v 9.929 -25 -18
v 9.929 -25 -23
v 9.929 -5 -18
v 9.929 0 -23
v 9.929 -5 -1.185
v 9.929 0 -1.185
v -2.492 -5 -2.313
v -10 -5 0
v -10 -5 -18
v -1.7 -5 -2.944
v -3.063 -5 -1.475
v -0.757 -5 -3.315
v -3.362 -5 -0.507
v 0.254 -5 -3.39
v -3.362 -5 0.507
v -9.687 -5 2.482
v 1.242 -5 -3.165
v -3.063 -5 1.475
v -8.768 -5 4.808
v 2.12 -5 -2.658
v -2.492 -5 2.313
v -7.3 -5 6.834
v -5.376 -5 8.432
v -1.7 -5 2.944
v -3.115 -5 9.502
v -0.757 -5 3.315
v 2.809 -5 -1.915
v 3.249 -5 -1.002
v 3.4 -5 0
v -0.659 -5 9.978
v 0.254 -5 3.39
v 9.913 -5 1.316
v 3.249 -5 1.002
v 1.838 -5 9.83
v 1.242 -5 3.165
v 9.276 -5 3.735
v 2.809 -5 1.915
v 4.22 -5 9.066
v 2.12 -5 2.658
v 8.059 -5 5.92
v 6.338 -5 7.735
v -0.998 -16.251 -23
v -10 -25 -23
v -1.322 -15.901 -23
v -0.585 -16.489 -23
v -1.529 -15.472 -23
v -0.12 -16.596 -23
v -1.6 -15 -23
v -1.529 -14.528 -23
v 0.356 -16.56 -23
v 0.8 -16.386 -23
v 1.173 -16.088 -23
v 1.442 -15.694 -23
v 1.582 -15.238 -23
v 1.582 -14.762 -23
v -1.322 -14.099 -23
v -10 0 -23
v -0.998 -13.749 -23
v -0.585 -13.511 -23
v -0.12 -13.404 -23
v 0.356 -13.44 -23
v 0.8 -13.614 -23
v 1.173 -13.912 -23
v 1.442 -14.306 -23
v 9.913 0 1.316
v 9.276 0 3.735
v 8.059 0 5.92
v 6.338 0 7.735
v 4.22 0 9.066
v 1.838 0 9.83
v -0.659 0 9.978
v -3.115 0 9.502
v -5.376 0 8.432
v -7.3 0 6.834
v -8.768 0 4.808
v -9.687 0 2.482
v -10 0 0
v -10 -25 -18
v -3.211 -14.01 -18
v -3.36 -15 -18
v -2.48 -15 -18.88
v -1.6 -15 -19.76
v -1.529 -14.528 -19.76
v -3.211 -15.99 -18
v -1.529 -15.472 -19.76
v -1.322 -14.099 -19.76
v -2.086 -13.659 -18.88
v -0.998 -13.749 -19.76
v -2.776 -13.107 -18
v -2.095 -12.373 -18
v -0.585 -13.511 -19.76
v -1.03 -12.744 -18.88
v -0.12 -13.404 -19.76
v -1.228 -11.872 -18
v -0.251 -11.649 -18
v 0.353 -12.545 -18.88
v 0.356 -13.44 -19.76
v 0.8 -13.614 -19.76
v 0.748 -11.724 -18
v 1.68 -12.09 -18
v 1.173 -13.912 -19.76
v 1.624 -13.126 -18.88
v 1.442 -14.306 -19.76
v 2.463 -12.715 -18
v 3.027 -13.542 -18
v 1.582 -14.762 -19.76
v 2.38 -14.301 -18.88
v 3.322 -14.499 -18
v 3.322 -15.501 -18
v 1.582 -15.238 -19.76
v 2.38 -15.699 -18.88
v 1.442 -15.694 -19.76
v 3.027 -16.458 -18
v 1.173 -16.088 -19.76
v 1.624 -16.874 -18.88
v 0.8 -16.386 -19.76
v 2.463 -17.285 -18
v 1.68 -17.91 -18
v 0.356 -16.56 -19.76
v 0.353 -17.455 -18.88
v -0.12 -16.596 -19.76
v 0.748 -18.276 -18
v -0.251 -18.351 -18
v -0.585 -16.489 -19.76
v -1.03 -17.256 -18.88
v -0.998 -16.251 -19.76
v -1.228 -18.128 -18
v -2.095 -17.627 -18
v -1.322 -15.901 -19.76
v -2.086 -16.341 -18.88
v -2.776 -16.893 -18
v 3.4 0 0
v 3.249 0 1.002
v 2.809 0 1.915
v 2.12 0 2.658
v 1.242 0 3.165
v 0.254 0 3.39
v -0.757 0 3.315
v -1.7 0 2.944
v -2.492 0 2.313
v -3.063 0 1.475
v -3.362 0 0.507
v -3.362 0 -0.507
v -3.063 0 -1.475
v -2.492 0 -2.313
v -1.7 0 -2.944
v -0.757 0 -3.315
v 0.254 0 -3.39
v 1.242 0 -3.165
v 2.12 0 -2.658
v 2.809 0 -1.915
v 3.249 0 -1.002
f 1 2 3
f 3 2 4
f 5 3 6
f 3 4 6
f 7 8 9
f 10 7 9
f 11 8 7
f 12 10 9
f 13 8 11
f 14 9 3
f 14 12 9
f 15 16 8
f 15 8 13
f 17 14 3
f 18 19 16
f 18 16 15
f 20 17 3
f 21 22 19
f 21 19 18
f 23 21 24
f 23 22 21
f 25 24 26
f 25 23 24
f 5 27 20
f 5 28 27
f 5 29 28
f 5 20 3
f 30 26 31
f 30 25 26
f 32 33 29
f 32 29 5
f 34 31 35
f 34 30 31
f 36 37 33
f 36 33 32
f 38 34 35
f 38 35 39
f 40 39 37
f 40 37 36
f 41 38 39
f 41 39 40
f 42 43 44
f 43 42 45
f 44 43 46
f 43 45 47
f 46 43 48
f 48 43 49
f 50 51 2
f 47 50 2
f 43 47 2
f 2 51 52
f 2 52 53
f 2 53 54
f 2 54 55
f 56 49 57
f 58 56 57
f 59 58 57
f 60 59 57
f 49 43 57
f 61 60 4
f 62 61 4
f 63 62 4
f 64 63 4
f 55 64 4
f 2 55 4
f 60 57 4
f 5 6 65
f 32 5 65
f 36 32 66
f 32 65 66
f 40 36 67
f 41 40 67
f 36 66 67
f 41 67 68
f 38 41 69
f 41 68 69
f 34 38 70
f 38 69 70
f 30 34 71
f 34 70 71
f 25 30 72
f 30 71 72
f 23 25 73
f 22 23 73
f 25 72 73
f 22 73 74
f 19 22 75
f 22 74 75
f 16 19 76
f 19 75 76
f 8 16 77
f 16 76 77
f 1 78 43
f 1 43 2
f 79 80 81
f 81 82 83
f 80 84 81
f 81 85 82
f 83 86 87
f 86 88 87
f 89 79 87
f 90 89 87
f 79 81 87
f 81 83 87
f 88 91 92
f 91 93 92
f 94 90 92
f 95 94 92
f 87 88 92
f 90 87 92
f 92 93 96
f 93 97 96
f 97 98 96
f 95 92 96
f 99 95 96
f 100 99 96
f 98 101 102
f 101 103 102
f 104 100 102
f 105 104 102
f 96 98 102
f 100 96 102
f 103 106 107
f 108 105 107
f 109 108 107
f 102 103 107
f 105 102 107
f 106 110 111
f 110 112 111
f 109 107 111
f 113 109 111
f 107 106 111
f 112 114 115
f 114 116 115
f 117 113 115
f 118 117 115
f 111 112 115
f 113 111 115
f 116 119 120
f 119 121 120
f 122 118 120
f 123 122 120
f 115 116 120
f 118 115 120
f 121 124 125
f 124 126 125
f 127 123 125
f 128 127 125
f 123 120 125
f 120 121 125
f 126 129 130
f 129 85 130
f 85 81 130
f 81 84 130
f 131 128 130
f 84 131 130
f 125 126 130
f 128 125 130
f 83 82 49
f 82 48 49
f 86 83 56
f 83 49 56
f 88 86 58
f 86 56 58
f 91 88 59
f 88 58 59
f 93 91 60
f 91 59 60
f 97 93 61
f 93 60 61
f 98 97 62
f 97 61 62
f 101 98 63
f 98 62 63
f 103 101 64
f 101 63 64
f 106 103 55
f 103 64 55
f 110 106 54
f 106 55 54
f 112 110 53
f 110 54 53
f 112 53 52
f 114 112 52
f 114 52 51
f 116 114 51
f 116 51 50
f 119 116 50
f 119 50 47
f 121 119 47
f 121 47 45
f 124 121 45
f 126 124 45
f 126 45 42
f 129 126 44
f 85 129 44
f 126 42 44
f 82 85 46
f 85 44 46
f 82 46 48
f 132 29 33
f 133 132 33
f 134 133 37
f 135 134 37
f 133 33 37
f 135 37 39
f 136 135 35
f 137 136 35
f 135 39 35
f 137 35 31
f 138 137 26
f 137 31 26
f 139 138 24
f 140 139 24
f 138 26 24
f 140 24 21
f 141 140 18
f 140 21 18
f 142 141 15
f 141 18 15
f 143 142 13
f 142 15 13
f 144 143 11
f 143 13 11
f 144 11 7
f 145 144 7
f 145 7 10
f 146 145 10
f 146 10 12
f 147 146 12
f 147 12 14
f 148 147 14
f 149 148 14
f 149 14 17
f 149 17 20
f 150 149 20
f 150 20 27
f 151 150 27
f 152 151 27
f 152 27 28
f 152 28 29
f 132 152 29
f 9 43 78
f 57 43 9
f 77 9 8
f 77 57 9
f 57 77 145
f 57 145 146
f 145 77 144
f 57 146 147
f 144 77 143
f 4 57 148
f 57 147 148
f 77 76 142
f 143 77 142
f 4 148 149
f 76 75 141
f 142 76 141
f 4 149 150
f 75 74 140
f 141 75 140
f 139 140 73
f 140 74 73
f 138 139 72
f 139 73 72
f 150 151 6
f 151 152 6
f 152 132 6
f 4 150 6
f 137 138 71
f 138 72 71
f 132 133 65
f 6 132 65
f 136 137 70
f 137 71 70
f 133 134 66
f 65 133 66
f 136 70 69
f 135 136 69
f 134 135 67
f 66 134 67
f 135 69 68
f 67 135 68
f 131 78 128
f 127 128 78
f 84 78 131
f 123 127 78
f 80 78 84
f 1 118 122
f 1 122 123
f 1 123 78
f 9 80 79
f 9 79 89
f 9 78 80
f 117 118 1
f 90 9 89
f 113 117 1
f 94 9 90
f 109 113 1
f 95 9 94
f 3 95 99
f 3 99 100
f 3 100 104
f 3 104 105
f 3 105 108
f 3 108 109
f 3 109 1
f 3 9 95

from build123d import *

# Parameters (mm, degrees)
F1_DEPTH       = 5
F2_W           = 19.9294948324
F2_H           = 5
F3_DEPTH       = 20
F5_D           = 6.8
F7_D           = 3.2
F7_CSINK_D     = 6.72
F7_CSINK_ANGLE = 90


with BuildPart() as f1:
    # F0 (on Front) → F1 (new body)
    with BuildSketch(Plane.XZ):
        with BuildLine():
            Line((9.9294948324, -23), (9.9294948324, -1.1853827958))
            ThreePointArc((9.9294948324, -1.1853827958), (0.5937388633, 9.9823581464), (-10, 0))
            Line((-10, 0), (-10, -23))
            Line((-10, -23), (9.9294948324, -23))
        make_face()
    extrude(amount=F1_DEPTH)

    # F2 (on face) → F3 (join)
    with BuildSketch(Plane.XZ.offset(5)):
        with Locations((-0.0352525838, -20.5)):
            Rectangle(F2_W, F2_H)
    extrude(amount=F3_DEPTH)

    # F5 (through all)
    with Locations(Plane(origin=(0, 0, 0), x_dir=(-1, 0, 0), z_dir=(0, 1, 0))):
        with Locations((0, 0)):
            Hole(F5_D / 2)

    # F7 (through all)
    with Locations(Plane.XY.offset(-18)):
        with Locations((0, -15)):
            CounterSinkHole(F7_D / 2, F7_CSINK_D / 2, counter_sink_angle=F7_CSINK_ANGLE)


solid = f1.part
